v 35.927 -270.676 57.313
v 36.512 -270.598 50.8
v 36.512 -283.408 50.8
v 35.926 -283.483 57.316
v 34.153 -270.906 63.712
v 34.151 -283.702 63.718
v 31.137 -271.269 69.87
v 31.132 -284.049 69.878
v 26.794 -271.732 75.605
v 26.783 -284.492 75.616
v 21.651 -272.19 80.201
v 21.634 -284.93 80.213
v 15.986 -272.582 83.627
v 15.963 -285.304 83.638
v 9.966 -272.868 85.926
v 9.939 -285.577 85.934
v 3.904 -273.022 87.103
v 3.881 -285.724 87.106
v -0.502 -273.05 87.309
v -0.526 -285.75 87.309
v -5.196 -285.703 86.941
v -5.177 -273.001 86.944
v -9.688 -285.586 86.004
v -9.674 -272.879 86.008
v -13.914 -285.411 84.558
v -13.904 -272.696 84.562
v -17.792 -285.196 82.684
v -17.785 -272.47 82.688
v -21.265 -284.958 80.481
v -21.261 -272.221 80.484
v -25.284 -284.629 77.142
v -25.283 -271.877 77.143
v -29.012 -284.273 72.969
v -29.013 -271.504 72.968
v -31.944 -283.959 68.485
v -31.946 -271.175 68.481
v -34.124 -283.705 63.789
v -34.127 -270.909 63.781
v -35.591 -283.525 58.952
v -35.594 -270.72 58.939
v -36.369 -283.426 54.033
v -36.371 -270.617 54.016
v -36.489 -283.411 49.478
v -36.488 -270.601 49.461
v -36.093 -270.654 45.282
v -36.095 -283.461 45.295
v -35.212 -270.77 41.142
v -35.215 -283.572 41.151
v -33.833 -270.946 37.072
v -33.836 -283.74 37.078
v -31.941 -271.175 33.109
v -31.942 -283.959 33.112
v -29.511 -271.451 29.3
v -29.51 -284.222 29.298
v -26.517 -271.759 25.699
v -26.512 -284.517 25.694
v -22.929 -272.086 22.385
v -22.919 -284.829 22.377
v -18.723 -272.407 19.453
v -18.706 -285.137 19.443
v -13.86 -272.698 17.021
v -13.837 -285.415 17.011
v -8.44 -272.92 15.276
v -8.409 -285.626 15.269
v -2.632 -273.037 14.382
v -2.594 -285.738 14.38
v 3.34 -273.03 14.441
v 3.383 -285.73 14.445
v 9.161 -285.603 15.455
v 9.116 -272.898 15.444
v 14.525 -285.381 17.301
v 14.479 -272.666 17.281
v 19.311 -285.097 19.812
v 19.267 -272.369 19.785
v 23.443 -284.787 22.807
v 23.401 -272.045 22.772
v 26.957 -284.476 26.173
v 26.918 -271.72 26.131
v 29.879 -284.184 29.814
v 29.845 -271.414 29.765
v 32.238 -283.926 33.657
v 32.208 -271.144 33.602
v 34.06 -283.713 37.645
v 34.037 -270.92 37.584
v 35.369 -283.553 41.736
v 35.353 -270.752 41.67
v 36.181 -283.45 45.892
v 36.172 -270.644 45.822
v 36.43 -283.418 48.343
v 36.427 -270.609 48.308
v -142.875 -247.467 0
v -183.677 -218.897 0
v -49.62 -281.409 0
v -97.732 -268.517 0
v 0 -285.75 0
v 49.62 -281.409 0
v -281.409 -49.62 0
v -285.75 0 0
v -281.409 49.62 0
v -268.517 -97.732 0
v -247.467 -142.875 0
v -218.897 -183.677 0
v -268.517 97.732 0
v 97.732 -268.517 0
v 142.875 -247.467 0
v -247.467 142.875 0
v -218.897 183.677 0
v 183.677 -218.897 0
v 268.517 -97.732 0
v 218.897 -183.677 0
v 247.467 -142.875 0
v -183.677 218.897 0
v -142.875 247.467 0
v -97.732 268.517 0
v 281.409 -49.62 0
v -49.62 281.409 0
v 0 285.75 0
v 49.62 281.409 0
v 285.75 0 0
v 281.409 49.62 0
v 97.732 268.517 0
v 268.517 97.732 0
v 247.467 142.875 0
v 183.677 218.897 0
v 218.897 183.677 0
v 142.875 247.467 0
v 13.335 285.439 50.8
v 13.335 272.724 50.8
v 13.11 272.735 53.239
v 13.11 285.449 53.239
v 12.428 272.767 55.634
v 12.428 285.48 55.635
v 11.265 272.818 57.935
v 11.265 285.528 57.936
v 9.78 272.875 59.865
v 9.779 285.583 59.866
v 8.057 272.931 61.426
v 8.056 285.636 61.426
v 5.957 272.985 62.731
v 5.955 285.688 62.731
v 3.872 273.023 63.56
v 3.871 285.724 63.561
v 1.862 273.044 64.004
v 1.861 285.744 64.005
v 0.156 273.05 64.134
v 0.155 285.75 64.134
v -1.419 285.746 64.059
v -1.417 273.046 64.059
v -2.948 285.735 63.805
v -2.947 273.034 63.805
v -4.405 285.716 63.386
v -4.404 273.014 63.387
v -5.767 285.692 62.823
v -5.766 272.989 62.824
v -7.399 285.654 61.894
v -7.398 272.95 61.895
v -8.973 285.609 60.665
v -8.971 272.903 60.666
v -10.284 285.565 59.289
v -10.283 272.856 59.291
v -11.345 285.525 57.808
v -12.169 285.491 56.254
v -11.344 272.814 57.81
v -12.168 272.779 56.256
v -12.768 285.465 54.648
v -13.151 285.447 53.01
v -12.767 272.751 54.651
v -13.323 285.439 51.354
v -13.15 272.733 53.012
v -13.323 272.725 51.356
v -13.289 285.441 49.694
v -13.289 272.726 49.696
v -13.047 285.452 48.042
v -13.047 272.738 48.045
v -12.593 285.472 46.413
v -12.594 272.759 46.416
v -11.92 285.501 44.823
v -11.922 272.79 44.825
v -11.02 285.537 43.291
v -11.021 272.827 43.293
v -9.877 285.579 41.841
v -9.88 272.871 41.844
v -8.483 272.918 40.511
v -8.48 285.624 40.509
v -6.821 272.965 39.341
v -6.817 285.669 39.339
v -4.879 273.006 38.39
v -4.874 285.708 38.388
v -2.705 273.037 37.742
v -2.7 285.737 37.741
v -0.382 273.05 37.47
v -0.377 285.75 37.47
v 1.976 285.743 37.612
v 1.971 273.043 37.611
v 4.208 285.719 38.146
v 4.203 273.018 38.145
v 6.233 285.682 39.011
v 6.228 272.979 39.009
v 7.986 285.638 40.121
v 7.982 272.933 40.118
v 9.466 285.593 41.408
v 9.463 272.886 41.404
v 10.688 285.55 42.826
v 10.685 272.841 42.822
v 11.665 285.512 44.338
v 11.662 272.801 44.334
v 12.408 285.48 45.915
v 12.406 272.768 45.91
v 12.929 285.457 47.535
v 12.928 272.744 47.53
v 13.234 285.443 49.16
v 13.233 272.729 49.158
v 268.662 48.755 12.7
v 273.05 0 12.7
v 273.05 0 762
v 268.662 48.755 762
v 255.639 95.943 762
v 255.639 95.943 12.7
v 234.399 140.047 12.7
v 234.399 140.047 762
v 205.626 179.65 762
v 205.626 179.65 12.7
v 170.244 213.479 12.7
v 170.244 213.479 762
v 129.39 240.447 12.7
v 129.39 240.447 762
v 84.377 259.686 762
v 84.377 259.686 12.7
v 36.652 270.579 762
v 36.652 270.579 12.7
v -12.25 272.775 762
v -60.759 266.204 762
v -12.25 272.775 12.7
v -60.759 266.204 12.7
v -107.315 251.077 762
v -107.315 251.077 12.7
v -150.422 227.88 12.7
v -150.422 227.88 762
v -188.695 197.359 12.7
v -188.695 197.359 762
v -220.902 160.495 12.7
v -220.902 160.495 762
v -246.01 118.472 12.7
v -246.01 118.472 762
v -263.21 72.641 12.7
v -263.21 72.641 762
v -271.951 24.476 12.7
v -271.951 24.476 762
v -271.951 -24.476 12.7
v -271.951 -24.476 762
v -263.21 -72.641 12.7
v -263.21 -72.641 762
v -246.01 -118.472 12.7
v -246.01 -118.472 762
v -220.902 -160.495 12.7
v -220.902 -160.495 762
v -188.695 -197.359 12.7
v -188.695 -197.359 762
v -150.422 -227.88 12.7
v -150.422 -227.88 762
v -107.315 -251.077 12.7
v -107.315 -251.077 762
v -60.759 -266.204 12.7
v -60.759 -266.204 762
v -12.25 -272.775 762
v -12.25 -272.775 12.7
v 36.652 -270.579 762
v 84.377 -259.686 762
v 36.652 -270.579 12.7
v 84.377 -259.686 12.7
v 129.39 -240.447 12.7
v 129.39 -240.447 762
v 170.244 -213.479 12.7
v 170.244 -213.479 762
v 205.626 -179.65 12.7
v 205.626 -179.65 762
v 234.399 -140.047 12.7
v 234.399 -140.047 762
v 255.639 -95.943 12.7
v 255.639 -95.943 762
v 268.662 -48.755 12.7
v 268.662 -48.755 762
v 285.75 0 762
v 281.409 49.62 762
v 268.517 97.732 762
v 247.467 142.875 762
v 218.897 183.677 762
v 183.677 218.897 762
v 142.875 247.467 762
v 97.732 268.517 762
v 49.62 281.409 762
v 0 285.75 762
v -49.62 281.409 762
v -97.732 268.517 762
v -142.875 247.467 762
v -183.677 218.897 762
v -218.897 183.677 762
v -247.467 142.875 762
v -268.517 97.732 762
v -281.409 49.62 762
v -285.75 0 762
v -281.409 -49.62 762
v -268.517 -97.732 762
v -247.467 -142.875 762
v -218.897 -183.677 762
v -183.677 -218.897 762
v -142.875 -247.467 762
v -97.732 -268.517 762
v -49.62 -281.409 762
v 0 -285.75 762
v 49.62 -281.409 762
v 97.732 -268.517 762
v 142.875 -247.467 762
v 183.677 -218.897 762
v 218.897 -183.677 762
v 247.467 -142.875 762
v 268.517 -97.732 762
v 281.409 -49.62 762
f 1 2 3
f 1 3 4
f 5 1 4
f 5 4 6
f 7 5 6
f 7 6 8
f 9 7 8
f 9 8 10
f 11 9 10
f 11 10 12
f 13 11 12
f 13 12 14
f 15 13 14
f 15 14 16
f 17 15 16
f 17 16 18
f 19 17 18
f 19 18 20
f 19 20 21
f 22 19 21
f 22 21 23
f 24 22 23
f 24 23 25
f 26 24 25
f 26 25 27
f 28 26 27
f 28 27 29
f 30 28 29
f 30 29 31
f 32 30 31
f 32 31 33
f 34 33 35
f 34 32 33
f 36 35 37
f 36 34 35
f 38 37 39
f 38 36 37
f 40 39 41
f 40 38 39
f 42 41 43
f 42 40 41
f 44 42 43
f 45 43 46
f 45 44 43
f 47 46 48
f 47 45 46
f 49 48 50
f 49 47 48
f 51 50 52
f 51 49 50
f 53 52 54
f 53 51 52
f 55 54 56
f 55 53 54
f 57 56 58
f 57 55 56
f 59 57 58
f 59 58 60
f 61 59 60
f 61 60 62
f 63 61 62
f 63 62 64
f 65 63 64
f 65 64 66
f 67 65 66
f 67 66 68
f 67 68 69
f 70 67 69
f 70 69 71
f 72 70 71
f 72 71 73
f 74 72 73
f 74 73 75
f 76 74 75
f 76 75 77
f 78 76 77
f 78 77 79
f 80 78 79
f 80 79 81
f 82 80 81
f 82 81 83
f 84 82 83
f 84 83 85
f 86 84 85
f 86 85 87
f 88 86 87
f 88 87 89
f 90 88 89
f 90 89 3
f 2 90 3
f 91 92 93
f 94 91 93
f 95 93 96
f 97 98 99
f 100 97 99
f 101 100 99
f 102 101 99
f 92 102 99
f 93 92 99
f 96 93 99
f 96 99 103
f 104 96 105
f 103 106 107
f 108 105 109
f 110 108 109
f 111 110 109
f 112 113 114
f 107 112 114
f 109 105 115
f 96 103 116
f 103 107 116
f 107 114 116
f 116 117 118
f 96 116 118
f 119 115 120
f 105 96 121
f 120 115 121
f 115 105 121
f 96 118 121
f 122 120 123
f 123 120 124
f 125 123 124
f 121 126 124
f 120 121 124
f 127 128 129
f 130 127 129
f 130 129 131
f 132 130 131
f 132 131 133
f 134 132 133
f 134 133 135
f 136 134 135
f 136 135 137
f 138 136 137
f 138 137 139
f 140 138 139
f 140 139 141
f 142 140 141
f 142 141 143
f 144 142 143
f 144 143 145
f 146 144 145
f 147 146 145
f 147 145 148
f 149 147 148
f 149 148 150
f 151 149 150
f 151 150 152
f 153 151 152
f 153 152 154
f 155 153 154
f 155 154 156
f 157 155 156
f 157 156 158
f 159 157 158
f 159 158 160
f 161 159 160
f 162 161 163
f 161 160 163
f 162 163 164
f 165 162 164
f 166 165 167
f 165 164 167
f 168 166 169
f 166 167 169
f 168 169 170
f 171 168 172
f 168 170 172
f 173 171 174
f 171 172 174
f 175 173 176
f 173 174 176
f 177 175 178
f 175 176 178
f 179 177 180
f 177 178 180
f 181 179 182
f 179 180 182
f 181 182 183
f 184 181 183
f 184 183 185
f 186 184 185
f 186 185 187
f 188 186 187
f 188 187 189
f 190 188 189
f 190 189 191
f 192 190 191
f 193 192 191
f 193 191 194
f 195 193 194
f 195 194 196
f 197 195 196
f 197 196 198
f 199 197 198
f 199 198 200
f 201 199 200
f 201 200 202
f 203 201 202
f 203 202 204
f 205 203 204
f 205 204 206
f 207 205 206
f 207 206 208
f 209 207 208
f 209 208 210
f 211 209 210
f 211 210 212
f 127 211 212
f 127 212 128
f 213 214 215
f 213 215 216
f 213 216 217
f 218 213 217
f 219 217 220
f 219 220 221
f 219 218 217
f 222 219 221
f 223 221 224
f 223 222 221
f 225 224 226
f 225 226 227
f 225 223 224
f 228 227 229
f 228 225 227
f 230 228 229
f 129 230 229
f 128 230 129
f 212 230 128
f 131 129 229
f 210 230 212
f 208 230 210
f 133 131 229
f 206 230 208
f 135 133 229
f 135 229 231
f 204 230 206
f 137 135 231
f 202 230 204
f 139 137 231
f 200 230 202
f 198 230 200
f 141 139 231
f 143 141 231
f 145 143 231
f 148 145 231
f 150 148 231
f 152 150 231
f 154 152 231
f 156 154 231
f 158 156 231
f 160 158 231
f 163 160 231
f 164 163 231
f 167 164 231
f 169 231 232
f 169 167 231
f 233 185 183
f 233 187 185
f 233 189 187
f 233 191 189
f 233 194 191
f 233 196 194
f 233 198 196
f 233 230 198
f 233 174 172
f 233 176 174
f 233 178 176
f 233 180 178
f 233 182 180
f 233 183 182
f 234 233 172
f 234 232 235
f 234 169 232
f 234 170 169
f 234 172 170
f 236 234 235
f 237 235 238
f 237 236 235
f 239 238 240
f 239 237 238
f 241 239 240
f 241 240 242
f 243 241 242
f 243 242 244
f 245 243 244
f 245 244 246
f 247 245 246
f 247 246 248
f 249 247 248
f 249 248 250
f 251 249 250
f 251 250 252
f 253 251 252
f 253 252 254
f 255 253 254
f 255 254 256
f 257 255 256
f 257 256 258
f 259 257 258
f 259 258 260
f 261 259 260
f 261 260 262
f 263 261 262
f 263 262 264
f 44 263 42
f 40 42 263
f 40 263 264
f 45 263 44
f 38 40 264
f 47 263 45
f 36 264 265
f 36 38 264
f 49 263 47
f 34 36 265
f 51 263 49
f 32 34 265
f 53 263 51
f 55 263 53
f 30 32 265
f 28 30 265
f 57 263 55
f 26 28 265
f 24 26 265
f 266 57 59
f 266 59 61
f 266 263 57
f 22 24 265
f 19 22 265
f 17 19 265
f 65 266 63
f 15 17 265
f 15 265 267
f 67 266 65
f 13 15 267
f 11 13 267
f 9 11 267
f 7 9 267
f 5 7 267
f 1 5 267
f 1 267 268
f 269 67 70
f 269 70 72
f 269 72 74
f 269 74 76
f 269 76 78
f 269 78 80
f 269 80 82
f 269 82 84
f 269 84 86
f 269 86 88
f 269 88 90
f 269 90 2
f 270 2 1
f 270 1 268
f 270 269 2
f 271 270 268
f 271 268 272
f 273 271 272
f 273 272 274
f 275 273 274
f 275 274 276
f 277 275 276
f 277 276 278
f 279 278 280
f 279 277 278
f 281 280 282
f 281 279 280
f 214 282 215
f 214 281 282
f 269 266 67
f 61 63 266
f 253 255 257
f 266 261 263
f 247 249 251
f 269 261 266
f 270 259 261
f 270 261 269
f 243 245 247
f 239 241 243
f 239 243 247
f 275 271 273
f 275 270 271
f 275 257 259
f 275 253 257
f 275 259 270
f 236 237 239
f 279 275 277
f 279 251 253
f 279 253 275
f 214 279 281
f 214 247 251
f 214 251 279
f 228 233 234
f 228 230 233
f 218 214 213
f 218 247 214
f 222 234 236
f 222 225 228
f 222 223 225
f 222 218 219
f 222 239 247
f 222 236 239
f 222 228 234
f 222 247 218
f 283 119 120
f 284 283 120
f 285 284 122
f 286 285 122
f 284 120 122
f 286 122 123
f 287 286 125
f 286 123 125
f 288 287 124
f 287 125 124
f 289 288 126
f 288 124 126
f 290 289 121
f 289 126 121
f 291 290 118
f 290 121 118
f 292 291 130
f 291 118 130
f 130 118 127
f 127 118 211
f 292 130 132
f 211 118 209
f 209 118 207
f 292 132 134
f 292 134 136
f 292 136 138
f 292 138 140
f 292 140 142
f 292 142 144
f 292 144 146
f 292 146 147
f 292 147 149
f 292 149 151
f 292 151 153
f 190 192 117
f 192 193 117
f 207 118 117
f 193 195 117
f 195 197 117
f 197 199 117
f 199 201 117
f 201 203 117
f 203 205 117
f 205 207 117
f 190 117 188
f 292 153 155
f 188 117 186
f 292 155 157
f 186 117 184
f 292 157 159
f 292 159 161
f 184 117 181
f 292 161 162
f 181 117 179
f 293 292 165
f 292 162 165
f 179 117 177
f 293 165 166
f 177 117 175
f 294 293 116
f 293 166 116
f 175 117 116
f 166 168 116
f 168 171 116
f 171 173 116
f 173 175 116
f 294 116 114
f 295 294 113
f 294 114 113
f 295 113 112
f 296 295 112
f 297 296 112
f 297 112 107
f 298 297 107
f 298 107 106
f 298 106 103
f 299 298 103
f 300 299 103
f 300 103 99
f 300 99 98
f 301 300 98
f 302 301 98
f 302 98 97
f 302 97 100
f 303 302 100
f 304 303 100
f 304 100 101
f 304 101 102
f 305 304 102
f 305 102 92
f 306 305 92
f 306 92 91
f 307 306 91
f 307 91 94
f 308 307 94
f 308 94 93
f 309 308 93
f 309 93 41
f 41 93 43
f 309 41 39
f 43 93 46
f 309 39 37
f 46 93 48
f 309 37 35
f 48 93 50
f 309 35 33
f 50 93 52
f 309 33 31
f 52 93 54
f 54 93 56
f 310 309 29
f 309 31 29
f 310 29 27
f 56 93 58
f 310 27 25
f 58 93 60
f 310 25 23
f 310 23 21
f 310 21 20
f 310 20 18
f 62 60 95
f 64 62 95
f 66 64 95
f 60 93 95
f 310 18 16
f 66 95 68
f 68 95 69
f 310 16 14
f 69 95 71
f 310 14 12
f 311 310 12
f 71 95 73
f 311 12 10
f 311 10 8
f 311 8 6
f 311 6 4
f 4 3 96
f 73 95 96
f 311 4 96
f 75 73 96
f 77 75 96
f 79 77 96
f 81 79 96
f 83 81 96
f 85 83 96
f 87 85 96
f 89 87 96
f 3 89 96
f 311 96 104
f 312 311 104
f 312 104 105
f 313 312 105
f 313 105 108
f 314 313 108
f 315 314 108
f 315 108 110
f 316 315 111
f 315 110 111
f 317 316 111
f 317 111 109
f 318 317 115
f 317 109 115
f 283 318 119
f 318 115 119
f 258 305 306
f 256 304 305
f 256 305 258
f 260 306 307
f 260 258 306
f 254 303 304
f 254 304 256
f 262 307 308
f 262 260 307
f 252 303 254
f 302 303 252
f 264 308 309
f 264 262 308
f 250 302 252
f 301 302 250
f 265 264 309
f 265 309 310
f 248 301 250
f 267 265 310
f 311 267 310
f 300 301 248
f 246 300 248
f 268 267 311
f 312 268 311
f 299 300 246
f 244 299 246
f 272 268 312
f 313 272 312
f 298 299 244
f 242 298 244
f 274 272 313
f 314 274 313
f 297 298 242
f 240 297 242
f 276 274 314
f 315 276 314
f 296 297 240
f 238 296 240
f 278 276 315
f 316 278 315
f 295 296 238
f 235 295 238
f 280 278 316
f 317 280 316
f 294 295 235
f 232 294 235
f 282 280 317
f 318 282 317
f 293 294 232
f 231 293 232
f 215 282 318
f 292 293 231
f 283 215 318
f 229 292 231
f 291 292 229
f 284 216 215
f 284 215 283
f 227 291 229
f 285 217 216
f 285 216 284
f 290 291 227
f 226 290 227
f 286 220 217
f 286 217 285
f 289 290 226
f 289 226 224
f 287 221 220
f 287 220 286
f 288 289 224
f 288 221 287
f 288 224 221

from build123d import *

# Parameters (mm, degrees)
F0_R     = 285.75
F1_DEPTH = 762
F2_T     = -12.7
F3_R     = 36.5125
F4_DEPTH = 327.66
F5_R     = 13.335
F6_DEPTH = 345.44


with BuildPart() as f1:
    # F0 (on Top) → F1 (new body)
    with BuildSketch(Plane.XY):
        Circle(F0_R)
    extrude(amount=F1_DEPTH)

    # F2
    f2_openings = [f1.faces().sort_by_distance(p)[0] for p in [
        (0, 0, 762),
    ]]
    offset(amount=F2_T, openings=f2_openings)

    # F3 (on Front) → F4 (cut)
    with BuildSketch(Plane.XZ):
        with Locations((0, 50.8)):
            Circle(F3_R)
    extrude(amount=F4_DEPTH, mode=Mode.SUBTRACT)

    # F5 (on Front) → F6 (cut)
    with BuildSketch(Plane.XZ):
        with Locations((0, 50.8)):
            Circle(F5_R)
    extrude(amount=-F6_DEPTH, mode=Mode.SUBTRACT)


solid = f1.part
